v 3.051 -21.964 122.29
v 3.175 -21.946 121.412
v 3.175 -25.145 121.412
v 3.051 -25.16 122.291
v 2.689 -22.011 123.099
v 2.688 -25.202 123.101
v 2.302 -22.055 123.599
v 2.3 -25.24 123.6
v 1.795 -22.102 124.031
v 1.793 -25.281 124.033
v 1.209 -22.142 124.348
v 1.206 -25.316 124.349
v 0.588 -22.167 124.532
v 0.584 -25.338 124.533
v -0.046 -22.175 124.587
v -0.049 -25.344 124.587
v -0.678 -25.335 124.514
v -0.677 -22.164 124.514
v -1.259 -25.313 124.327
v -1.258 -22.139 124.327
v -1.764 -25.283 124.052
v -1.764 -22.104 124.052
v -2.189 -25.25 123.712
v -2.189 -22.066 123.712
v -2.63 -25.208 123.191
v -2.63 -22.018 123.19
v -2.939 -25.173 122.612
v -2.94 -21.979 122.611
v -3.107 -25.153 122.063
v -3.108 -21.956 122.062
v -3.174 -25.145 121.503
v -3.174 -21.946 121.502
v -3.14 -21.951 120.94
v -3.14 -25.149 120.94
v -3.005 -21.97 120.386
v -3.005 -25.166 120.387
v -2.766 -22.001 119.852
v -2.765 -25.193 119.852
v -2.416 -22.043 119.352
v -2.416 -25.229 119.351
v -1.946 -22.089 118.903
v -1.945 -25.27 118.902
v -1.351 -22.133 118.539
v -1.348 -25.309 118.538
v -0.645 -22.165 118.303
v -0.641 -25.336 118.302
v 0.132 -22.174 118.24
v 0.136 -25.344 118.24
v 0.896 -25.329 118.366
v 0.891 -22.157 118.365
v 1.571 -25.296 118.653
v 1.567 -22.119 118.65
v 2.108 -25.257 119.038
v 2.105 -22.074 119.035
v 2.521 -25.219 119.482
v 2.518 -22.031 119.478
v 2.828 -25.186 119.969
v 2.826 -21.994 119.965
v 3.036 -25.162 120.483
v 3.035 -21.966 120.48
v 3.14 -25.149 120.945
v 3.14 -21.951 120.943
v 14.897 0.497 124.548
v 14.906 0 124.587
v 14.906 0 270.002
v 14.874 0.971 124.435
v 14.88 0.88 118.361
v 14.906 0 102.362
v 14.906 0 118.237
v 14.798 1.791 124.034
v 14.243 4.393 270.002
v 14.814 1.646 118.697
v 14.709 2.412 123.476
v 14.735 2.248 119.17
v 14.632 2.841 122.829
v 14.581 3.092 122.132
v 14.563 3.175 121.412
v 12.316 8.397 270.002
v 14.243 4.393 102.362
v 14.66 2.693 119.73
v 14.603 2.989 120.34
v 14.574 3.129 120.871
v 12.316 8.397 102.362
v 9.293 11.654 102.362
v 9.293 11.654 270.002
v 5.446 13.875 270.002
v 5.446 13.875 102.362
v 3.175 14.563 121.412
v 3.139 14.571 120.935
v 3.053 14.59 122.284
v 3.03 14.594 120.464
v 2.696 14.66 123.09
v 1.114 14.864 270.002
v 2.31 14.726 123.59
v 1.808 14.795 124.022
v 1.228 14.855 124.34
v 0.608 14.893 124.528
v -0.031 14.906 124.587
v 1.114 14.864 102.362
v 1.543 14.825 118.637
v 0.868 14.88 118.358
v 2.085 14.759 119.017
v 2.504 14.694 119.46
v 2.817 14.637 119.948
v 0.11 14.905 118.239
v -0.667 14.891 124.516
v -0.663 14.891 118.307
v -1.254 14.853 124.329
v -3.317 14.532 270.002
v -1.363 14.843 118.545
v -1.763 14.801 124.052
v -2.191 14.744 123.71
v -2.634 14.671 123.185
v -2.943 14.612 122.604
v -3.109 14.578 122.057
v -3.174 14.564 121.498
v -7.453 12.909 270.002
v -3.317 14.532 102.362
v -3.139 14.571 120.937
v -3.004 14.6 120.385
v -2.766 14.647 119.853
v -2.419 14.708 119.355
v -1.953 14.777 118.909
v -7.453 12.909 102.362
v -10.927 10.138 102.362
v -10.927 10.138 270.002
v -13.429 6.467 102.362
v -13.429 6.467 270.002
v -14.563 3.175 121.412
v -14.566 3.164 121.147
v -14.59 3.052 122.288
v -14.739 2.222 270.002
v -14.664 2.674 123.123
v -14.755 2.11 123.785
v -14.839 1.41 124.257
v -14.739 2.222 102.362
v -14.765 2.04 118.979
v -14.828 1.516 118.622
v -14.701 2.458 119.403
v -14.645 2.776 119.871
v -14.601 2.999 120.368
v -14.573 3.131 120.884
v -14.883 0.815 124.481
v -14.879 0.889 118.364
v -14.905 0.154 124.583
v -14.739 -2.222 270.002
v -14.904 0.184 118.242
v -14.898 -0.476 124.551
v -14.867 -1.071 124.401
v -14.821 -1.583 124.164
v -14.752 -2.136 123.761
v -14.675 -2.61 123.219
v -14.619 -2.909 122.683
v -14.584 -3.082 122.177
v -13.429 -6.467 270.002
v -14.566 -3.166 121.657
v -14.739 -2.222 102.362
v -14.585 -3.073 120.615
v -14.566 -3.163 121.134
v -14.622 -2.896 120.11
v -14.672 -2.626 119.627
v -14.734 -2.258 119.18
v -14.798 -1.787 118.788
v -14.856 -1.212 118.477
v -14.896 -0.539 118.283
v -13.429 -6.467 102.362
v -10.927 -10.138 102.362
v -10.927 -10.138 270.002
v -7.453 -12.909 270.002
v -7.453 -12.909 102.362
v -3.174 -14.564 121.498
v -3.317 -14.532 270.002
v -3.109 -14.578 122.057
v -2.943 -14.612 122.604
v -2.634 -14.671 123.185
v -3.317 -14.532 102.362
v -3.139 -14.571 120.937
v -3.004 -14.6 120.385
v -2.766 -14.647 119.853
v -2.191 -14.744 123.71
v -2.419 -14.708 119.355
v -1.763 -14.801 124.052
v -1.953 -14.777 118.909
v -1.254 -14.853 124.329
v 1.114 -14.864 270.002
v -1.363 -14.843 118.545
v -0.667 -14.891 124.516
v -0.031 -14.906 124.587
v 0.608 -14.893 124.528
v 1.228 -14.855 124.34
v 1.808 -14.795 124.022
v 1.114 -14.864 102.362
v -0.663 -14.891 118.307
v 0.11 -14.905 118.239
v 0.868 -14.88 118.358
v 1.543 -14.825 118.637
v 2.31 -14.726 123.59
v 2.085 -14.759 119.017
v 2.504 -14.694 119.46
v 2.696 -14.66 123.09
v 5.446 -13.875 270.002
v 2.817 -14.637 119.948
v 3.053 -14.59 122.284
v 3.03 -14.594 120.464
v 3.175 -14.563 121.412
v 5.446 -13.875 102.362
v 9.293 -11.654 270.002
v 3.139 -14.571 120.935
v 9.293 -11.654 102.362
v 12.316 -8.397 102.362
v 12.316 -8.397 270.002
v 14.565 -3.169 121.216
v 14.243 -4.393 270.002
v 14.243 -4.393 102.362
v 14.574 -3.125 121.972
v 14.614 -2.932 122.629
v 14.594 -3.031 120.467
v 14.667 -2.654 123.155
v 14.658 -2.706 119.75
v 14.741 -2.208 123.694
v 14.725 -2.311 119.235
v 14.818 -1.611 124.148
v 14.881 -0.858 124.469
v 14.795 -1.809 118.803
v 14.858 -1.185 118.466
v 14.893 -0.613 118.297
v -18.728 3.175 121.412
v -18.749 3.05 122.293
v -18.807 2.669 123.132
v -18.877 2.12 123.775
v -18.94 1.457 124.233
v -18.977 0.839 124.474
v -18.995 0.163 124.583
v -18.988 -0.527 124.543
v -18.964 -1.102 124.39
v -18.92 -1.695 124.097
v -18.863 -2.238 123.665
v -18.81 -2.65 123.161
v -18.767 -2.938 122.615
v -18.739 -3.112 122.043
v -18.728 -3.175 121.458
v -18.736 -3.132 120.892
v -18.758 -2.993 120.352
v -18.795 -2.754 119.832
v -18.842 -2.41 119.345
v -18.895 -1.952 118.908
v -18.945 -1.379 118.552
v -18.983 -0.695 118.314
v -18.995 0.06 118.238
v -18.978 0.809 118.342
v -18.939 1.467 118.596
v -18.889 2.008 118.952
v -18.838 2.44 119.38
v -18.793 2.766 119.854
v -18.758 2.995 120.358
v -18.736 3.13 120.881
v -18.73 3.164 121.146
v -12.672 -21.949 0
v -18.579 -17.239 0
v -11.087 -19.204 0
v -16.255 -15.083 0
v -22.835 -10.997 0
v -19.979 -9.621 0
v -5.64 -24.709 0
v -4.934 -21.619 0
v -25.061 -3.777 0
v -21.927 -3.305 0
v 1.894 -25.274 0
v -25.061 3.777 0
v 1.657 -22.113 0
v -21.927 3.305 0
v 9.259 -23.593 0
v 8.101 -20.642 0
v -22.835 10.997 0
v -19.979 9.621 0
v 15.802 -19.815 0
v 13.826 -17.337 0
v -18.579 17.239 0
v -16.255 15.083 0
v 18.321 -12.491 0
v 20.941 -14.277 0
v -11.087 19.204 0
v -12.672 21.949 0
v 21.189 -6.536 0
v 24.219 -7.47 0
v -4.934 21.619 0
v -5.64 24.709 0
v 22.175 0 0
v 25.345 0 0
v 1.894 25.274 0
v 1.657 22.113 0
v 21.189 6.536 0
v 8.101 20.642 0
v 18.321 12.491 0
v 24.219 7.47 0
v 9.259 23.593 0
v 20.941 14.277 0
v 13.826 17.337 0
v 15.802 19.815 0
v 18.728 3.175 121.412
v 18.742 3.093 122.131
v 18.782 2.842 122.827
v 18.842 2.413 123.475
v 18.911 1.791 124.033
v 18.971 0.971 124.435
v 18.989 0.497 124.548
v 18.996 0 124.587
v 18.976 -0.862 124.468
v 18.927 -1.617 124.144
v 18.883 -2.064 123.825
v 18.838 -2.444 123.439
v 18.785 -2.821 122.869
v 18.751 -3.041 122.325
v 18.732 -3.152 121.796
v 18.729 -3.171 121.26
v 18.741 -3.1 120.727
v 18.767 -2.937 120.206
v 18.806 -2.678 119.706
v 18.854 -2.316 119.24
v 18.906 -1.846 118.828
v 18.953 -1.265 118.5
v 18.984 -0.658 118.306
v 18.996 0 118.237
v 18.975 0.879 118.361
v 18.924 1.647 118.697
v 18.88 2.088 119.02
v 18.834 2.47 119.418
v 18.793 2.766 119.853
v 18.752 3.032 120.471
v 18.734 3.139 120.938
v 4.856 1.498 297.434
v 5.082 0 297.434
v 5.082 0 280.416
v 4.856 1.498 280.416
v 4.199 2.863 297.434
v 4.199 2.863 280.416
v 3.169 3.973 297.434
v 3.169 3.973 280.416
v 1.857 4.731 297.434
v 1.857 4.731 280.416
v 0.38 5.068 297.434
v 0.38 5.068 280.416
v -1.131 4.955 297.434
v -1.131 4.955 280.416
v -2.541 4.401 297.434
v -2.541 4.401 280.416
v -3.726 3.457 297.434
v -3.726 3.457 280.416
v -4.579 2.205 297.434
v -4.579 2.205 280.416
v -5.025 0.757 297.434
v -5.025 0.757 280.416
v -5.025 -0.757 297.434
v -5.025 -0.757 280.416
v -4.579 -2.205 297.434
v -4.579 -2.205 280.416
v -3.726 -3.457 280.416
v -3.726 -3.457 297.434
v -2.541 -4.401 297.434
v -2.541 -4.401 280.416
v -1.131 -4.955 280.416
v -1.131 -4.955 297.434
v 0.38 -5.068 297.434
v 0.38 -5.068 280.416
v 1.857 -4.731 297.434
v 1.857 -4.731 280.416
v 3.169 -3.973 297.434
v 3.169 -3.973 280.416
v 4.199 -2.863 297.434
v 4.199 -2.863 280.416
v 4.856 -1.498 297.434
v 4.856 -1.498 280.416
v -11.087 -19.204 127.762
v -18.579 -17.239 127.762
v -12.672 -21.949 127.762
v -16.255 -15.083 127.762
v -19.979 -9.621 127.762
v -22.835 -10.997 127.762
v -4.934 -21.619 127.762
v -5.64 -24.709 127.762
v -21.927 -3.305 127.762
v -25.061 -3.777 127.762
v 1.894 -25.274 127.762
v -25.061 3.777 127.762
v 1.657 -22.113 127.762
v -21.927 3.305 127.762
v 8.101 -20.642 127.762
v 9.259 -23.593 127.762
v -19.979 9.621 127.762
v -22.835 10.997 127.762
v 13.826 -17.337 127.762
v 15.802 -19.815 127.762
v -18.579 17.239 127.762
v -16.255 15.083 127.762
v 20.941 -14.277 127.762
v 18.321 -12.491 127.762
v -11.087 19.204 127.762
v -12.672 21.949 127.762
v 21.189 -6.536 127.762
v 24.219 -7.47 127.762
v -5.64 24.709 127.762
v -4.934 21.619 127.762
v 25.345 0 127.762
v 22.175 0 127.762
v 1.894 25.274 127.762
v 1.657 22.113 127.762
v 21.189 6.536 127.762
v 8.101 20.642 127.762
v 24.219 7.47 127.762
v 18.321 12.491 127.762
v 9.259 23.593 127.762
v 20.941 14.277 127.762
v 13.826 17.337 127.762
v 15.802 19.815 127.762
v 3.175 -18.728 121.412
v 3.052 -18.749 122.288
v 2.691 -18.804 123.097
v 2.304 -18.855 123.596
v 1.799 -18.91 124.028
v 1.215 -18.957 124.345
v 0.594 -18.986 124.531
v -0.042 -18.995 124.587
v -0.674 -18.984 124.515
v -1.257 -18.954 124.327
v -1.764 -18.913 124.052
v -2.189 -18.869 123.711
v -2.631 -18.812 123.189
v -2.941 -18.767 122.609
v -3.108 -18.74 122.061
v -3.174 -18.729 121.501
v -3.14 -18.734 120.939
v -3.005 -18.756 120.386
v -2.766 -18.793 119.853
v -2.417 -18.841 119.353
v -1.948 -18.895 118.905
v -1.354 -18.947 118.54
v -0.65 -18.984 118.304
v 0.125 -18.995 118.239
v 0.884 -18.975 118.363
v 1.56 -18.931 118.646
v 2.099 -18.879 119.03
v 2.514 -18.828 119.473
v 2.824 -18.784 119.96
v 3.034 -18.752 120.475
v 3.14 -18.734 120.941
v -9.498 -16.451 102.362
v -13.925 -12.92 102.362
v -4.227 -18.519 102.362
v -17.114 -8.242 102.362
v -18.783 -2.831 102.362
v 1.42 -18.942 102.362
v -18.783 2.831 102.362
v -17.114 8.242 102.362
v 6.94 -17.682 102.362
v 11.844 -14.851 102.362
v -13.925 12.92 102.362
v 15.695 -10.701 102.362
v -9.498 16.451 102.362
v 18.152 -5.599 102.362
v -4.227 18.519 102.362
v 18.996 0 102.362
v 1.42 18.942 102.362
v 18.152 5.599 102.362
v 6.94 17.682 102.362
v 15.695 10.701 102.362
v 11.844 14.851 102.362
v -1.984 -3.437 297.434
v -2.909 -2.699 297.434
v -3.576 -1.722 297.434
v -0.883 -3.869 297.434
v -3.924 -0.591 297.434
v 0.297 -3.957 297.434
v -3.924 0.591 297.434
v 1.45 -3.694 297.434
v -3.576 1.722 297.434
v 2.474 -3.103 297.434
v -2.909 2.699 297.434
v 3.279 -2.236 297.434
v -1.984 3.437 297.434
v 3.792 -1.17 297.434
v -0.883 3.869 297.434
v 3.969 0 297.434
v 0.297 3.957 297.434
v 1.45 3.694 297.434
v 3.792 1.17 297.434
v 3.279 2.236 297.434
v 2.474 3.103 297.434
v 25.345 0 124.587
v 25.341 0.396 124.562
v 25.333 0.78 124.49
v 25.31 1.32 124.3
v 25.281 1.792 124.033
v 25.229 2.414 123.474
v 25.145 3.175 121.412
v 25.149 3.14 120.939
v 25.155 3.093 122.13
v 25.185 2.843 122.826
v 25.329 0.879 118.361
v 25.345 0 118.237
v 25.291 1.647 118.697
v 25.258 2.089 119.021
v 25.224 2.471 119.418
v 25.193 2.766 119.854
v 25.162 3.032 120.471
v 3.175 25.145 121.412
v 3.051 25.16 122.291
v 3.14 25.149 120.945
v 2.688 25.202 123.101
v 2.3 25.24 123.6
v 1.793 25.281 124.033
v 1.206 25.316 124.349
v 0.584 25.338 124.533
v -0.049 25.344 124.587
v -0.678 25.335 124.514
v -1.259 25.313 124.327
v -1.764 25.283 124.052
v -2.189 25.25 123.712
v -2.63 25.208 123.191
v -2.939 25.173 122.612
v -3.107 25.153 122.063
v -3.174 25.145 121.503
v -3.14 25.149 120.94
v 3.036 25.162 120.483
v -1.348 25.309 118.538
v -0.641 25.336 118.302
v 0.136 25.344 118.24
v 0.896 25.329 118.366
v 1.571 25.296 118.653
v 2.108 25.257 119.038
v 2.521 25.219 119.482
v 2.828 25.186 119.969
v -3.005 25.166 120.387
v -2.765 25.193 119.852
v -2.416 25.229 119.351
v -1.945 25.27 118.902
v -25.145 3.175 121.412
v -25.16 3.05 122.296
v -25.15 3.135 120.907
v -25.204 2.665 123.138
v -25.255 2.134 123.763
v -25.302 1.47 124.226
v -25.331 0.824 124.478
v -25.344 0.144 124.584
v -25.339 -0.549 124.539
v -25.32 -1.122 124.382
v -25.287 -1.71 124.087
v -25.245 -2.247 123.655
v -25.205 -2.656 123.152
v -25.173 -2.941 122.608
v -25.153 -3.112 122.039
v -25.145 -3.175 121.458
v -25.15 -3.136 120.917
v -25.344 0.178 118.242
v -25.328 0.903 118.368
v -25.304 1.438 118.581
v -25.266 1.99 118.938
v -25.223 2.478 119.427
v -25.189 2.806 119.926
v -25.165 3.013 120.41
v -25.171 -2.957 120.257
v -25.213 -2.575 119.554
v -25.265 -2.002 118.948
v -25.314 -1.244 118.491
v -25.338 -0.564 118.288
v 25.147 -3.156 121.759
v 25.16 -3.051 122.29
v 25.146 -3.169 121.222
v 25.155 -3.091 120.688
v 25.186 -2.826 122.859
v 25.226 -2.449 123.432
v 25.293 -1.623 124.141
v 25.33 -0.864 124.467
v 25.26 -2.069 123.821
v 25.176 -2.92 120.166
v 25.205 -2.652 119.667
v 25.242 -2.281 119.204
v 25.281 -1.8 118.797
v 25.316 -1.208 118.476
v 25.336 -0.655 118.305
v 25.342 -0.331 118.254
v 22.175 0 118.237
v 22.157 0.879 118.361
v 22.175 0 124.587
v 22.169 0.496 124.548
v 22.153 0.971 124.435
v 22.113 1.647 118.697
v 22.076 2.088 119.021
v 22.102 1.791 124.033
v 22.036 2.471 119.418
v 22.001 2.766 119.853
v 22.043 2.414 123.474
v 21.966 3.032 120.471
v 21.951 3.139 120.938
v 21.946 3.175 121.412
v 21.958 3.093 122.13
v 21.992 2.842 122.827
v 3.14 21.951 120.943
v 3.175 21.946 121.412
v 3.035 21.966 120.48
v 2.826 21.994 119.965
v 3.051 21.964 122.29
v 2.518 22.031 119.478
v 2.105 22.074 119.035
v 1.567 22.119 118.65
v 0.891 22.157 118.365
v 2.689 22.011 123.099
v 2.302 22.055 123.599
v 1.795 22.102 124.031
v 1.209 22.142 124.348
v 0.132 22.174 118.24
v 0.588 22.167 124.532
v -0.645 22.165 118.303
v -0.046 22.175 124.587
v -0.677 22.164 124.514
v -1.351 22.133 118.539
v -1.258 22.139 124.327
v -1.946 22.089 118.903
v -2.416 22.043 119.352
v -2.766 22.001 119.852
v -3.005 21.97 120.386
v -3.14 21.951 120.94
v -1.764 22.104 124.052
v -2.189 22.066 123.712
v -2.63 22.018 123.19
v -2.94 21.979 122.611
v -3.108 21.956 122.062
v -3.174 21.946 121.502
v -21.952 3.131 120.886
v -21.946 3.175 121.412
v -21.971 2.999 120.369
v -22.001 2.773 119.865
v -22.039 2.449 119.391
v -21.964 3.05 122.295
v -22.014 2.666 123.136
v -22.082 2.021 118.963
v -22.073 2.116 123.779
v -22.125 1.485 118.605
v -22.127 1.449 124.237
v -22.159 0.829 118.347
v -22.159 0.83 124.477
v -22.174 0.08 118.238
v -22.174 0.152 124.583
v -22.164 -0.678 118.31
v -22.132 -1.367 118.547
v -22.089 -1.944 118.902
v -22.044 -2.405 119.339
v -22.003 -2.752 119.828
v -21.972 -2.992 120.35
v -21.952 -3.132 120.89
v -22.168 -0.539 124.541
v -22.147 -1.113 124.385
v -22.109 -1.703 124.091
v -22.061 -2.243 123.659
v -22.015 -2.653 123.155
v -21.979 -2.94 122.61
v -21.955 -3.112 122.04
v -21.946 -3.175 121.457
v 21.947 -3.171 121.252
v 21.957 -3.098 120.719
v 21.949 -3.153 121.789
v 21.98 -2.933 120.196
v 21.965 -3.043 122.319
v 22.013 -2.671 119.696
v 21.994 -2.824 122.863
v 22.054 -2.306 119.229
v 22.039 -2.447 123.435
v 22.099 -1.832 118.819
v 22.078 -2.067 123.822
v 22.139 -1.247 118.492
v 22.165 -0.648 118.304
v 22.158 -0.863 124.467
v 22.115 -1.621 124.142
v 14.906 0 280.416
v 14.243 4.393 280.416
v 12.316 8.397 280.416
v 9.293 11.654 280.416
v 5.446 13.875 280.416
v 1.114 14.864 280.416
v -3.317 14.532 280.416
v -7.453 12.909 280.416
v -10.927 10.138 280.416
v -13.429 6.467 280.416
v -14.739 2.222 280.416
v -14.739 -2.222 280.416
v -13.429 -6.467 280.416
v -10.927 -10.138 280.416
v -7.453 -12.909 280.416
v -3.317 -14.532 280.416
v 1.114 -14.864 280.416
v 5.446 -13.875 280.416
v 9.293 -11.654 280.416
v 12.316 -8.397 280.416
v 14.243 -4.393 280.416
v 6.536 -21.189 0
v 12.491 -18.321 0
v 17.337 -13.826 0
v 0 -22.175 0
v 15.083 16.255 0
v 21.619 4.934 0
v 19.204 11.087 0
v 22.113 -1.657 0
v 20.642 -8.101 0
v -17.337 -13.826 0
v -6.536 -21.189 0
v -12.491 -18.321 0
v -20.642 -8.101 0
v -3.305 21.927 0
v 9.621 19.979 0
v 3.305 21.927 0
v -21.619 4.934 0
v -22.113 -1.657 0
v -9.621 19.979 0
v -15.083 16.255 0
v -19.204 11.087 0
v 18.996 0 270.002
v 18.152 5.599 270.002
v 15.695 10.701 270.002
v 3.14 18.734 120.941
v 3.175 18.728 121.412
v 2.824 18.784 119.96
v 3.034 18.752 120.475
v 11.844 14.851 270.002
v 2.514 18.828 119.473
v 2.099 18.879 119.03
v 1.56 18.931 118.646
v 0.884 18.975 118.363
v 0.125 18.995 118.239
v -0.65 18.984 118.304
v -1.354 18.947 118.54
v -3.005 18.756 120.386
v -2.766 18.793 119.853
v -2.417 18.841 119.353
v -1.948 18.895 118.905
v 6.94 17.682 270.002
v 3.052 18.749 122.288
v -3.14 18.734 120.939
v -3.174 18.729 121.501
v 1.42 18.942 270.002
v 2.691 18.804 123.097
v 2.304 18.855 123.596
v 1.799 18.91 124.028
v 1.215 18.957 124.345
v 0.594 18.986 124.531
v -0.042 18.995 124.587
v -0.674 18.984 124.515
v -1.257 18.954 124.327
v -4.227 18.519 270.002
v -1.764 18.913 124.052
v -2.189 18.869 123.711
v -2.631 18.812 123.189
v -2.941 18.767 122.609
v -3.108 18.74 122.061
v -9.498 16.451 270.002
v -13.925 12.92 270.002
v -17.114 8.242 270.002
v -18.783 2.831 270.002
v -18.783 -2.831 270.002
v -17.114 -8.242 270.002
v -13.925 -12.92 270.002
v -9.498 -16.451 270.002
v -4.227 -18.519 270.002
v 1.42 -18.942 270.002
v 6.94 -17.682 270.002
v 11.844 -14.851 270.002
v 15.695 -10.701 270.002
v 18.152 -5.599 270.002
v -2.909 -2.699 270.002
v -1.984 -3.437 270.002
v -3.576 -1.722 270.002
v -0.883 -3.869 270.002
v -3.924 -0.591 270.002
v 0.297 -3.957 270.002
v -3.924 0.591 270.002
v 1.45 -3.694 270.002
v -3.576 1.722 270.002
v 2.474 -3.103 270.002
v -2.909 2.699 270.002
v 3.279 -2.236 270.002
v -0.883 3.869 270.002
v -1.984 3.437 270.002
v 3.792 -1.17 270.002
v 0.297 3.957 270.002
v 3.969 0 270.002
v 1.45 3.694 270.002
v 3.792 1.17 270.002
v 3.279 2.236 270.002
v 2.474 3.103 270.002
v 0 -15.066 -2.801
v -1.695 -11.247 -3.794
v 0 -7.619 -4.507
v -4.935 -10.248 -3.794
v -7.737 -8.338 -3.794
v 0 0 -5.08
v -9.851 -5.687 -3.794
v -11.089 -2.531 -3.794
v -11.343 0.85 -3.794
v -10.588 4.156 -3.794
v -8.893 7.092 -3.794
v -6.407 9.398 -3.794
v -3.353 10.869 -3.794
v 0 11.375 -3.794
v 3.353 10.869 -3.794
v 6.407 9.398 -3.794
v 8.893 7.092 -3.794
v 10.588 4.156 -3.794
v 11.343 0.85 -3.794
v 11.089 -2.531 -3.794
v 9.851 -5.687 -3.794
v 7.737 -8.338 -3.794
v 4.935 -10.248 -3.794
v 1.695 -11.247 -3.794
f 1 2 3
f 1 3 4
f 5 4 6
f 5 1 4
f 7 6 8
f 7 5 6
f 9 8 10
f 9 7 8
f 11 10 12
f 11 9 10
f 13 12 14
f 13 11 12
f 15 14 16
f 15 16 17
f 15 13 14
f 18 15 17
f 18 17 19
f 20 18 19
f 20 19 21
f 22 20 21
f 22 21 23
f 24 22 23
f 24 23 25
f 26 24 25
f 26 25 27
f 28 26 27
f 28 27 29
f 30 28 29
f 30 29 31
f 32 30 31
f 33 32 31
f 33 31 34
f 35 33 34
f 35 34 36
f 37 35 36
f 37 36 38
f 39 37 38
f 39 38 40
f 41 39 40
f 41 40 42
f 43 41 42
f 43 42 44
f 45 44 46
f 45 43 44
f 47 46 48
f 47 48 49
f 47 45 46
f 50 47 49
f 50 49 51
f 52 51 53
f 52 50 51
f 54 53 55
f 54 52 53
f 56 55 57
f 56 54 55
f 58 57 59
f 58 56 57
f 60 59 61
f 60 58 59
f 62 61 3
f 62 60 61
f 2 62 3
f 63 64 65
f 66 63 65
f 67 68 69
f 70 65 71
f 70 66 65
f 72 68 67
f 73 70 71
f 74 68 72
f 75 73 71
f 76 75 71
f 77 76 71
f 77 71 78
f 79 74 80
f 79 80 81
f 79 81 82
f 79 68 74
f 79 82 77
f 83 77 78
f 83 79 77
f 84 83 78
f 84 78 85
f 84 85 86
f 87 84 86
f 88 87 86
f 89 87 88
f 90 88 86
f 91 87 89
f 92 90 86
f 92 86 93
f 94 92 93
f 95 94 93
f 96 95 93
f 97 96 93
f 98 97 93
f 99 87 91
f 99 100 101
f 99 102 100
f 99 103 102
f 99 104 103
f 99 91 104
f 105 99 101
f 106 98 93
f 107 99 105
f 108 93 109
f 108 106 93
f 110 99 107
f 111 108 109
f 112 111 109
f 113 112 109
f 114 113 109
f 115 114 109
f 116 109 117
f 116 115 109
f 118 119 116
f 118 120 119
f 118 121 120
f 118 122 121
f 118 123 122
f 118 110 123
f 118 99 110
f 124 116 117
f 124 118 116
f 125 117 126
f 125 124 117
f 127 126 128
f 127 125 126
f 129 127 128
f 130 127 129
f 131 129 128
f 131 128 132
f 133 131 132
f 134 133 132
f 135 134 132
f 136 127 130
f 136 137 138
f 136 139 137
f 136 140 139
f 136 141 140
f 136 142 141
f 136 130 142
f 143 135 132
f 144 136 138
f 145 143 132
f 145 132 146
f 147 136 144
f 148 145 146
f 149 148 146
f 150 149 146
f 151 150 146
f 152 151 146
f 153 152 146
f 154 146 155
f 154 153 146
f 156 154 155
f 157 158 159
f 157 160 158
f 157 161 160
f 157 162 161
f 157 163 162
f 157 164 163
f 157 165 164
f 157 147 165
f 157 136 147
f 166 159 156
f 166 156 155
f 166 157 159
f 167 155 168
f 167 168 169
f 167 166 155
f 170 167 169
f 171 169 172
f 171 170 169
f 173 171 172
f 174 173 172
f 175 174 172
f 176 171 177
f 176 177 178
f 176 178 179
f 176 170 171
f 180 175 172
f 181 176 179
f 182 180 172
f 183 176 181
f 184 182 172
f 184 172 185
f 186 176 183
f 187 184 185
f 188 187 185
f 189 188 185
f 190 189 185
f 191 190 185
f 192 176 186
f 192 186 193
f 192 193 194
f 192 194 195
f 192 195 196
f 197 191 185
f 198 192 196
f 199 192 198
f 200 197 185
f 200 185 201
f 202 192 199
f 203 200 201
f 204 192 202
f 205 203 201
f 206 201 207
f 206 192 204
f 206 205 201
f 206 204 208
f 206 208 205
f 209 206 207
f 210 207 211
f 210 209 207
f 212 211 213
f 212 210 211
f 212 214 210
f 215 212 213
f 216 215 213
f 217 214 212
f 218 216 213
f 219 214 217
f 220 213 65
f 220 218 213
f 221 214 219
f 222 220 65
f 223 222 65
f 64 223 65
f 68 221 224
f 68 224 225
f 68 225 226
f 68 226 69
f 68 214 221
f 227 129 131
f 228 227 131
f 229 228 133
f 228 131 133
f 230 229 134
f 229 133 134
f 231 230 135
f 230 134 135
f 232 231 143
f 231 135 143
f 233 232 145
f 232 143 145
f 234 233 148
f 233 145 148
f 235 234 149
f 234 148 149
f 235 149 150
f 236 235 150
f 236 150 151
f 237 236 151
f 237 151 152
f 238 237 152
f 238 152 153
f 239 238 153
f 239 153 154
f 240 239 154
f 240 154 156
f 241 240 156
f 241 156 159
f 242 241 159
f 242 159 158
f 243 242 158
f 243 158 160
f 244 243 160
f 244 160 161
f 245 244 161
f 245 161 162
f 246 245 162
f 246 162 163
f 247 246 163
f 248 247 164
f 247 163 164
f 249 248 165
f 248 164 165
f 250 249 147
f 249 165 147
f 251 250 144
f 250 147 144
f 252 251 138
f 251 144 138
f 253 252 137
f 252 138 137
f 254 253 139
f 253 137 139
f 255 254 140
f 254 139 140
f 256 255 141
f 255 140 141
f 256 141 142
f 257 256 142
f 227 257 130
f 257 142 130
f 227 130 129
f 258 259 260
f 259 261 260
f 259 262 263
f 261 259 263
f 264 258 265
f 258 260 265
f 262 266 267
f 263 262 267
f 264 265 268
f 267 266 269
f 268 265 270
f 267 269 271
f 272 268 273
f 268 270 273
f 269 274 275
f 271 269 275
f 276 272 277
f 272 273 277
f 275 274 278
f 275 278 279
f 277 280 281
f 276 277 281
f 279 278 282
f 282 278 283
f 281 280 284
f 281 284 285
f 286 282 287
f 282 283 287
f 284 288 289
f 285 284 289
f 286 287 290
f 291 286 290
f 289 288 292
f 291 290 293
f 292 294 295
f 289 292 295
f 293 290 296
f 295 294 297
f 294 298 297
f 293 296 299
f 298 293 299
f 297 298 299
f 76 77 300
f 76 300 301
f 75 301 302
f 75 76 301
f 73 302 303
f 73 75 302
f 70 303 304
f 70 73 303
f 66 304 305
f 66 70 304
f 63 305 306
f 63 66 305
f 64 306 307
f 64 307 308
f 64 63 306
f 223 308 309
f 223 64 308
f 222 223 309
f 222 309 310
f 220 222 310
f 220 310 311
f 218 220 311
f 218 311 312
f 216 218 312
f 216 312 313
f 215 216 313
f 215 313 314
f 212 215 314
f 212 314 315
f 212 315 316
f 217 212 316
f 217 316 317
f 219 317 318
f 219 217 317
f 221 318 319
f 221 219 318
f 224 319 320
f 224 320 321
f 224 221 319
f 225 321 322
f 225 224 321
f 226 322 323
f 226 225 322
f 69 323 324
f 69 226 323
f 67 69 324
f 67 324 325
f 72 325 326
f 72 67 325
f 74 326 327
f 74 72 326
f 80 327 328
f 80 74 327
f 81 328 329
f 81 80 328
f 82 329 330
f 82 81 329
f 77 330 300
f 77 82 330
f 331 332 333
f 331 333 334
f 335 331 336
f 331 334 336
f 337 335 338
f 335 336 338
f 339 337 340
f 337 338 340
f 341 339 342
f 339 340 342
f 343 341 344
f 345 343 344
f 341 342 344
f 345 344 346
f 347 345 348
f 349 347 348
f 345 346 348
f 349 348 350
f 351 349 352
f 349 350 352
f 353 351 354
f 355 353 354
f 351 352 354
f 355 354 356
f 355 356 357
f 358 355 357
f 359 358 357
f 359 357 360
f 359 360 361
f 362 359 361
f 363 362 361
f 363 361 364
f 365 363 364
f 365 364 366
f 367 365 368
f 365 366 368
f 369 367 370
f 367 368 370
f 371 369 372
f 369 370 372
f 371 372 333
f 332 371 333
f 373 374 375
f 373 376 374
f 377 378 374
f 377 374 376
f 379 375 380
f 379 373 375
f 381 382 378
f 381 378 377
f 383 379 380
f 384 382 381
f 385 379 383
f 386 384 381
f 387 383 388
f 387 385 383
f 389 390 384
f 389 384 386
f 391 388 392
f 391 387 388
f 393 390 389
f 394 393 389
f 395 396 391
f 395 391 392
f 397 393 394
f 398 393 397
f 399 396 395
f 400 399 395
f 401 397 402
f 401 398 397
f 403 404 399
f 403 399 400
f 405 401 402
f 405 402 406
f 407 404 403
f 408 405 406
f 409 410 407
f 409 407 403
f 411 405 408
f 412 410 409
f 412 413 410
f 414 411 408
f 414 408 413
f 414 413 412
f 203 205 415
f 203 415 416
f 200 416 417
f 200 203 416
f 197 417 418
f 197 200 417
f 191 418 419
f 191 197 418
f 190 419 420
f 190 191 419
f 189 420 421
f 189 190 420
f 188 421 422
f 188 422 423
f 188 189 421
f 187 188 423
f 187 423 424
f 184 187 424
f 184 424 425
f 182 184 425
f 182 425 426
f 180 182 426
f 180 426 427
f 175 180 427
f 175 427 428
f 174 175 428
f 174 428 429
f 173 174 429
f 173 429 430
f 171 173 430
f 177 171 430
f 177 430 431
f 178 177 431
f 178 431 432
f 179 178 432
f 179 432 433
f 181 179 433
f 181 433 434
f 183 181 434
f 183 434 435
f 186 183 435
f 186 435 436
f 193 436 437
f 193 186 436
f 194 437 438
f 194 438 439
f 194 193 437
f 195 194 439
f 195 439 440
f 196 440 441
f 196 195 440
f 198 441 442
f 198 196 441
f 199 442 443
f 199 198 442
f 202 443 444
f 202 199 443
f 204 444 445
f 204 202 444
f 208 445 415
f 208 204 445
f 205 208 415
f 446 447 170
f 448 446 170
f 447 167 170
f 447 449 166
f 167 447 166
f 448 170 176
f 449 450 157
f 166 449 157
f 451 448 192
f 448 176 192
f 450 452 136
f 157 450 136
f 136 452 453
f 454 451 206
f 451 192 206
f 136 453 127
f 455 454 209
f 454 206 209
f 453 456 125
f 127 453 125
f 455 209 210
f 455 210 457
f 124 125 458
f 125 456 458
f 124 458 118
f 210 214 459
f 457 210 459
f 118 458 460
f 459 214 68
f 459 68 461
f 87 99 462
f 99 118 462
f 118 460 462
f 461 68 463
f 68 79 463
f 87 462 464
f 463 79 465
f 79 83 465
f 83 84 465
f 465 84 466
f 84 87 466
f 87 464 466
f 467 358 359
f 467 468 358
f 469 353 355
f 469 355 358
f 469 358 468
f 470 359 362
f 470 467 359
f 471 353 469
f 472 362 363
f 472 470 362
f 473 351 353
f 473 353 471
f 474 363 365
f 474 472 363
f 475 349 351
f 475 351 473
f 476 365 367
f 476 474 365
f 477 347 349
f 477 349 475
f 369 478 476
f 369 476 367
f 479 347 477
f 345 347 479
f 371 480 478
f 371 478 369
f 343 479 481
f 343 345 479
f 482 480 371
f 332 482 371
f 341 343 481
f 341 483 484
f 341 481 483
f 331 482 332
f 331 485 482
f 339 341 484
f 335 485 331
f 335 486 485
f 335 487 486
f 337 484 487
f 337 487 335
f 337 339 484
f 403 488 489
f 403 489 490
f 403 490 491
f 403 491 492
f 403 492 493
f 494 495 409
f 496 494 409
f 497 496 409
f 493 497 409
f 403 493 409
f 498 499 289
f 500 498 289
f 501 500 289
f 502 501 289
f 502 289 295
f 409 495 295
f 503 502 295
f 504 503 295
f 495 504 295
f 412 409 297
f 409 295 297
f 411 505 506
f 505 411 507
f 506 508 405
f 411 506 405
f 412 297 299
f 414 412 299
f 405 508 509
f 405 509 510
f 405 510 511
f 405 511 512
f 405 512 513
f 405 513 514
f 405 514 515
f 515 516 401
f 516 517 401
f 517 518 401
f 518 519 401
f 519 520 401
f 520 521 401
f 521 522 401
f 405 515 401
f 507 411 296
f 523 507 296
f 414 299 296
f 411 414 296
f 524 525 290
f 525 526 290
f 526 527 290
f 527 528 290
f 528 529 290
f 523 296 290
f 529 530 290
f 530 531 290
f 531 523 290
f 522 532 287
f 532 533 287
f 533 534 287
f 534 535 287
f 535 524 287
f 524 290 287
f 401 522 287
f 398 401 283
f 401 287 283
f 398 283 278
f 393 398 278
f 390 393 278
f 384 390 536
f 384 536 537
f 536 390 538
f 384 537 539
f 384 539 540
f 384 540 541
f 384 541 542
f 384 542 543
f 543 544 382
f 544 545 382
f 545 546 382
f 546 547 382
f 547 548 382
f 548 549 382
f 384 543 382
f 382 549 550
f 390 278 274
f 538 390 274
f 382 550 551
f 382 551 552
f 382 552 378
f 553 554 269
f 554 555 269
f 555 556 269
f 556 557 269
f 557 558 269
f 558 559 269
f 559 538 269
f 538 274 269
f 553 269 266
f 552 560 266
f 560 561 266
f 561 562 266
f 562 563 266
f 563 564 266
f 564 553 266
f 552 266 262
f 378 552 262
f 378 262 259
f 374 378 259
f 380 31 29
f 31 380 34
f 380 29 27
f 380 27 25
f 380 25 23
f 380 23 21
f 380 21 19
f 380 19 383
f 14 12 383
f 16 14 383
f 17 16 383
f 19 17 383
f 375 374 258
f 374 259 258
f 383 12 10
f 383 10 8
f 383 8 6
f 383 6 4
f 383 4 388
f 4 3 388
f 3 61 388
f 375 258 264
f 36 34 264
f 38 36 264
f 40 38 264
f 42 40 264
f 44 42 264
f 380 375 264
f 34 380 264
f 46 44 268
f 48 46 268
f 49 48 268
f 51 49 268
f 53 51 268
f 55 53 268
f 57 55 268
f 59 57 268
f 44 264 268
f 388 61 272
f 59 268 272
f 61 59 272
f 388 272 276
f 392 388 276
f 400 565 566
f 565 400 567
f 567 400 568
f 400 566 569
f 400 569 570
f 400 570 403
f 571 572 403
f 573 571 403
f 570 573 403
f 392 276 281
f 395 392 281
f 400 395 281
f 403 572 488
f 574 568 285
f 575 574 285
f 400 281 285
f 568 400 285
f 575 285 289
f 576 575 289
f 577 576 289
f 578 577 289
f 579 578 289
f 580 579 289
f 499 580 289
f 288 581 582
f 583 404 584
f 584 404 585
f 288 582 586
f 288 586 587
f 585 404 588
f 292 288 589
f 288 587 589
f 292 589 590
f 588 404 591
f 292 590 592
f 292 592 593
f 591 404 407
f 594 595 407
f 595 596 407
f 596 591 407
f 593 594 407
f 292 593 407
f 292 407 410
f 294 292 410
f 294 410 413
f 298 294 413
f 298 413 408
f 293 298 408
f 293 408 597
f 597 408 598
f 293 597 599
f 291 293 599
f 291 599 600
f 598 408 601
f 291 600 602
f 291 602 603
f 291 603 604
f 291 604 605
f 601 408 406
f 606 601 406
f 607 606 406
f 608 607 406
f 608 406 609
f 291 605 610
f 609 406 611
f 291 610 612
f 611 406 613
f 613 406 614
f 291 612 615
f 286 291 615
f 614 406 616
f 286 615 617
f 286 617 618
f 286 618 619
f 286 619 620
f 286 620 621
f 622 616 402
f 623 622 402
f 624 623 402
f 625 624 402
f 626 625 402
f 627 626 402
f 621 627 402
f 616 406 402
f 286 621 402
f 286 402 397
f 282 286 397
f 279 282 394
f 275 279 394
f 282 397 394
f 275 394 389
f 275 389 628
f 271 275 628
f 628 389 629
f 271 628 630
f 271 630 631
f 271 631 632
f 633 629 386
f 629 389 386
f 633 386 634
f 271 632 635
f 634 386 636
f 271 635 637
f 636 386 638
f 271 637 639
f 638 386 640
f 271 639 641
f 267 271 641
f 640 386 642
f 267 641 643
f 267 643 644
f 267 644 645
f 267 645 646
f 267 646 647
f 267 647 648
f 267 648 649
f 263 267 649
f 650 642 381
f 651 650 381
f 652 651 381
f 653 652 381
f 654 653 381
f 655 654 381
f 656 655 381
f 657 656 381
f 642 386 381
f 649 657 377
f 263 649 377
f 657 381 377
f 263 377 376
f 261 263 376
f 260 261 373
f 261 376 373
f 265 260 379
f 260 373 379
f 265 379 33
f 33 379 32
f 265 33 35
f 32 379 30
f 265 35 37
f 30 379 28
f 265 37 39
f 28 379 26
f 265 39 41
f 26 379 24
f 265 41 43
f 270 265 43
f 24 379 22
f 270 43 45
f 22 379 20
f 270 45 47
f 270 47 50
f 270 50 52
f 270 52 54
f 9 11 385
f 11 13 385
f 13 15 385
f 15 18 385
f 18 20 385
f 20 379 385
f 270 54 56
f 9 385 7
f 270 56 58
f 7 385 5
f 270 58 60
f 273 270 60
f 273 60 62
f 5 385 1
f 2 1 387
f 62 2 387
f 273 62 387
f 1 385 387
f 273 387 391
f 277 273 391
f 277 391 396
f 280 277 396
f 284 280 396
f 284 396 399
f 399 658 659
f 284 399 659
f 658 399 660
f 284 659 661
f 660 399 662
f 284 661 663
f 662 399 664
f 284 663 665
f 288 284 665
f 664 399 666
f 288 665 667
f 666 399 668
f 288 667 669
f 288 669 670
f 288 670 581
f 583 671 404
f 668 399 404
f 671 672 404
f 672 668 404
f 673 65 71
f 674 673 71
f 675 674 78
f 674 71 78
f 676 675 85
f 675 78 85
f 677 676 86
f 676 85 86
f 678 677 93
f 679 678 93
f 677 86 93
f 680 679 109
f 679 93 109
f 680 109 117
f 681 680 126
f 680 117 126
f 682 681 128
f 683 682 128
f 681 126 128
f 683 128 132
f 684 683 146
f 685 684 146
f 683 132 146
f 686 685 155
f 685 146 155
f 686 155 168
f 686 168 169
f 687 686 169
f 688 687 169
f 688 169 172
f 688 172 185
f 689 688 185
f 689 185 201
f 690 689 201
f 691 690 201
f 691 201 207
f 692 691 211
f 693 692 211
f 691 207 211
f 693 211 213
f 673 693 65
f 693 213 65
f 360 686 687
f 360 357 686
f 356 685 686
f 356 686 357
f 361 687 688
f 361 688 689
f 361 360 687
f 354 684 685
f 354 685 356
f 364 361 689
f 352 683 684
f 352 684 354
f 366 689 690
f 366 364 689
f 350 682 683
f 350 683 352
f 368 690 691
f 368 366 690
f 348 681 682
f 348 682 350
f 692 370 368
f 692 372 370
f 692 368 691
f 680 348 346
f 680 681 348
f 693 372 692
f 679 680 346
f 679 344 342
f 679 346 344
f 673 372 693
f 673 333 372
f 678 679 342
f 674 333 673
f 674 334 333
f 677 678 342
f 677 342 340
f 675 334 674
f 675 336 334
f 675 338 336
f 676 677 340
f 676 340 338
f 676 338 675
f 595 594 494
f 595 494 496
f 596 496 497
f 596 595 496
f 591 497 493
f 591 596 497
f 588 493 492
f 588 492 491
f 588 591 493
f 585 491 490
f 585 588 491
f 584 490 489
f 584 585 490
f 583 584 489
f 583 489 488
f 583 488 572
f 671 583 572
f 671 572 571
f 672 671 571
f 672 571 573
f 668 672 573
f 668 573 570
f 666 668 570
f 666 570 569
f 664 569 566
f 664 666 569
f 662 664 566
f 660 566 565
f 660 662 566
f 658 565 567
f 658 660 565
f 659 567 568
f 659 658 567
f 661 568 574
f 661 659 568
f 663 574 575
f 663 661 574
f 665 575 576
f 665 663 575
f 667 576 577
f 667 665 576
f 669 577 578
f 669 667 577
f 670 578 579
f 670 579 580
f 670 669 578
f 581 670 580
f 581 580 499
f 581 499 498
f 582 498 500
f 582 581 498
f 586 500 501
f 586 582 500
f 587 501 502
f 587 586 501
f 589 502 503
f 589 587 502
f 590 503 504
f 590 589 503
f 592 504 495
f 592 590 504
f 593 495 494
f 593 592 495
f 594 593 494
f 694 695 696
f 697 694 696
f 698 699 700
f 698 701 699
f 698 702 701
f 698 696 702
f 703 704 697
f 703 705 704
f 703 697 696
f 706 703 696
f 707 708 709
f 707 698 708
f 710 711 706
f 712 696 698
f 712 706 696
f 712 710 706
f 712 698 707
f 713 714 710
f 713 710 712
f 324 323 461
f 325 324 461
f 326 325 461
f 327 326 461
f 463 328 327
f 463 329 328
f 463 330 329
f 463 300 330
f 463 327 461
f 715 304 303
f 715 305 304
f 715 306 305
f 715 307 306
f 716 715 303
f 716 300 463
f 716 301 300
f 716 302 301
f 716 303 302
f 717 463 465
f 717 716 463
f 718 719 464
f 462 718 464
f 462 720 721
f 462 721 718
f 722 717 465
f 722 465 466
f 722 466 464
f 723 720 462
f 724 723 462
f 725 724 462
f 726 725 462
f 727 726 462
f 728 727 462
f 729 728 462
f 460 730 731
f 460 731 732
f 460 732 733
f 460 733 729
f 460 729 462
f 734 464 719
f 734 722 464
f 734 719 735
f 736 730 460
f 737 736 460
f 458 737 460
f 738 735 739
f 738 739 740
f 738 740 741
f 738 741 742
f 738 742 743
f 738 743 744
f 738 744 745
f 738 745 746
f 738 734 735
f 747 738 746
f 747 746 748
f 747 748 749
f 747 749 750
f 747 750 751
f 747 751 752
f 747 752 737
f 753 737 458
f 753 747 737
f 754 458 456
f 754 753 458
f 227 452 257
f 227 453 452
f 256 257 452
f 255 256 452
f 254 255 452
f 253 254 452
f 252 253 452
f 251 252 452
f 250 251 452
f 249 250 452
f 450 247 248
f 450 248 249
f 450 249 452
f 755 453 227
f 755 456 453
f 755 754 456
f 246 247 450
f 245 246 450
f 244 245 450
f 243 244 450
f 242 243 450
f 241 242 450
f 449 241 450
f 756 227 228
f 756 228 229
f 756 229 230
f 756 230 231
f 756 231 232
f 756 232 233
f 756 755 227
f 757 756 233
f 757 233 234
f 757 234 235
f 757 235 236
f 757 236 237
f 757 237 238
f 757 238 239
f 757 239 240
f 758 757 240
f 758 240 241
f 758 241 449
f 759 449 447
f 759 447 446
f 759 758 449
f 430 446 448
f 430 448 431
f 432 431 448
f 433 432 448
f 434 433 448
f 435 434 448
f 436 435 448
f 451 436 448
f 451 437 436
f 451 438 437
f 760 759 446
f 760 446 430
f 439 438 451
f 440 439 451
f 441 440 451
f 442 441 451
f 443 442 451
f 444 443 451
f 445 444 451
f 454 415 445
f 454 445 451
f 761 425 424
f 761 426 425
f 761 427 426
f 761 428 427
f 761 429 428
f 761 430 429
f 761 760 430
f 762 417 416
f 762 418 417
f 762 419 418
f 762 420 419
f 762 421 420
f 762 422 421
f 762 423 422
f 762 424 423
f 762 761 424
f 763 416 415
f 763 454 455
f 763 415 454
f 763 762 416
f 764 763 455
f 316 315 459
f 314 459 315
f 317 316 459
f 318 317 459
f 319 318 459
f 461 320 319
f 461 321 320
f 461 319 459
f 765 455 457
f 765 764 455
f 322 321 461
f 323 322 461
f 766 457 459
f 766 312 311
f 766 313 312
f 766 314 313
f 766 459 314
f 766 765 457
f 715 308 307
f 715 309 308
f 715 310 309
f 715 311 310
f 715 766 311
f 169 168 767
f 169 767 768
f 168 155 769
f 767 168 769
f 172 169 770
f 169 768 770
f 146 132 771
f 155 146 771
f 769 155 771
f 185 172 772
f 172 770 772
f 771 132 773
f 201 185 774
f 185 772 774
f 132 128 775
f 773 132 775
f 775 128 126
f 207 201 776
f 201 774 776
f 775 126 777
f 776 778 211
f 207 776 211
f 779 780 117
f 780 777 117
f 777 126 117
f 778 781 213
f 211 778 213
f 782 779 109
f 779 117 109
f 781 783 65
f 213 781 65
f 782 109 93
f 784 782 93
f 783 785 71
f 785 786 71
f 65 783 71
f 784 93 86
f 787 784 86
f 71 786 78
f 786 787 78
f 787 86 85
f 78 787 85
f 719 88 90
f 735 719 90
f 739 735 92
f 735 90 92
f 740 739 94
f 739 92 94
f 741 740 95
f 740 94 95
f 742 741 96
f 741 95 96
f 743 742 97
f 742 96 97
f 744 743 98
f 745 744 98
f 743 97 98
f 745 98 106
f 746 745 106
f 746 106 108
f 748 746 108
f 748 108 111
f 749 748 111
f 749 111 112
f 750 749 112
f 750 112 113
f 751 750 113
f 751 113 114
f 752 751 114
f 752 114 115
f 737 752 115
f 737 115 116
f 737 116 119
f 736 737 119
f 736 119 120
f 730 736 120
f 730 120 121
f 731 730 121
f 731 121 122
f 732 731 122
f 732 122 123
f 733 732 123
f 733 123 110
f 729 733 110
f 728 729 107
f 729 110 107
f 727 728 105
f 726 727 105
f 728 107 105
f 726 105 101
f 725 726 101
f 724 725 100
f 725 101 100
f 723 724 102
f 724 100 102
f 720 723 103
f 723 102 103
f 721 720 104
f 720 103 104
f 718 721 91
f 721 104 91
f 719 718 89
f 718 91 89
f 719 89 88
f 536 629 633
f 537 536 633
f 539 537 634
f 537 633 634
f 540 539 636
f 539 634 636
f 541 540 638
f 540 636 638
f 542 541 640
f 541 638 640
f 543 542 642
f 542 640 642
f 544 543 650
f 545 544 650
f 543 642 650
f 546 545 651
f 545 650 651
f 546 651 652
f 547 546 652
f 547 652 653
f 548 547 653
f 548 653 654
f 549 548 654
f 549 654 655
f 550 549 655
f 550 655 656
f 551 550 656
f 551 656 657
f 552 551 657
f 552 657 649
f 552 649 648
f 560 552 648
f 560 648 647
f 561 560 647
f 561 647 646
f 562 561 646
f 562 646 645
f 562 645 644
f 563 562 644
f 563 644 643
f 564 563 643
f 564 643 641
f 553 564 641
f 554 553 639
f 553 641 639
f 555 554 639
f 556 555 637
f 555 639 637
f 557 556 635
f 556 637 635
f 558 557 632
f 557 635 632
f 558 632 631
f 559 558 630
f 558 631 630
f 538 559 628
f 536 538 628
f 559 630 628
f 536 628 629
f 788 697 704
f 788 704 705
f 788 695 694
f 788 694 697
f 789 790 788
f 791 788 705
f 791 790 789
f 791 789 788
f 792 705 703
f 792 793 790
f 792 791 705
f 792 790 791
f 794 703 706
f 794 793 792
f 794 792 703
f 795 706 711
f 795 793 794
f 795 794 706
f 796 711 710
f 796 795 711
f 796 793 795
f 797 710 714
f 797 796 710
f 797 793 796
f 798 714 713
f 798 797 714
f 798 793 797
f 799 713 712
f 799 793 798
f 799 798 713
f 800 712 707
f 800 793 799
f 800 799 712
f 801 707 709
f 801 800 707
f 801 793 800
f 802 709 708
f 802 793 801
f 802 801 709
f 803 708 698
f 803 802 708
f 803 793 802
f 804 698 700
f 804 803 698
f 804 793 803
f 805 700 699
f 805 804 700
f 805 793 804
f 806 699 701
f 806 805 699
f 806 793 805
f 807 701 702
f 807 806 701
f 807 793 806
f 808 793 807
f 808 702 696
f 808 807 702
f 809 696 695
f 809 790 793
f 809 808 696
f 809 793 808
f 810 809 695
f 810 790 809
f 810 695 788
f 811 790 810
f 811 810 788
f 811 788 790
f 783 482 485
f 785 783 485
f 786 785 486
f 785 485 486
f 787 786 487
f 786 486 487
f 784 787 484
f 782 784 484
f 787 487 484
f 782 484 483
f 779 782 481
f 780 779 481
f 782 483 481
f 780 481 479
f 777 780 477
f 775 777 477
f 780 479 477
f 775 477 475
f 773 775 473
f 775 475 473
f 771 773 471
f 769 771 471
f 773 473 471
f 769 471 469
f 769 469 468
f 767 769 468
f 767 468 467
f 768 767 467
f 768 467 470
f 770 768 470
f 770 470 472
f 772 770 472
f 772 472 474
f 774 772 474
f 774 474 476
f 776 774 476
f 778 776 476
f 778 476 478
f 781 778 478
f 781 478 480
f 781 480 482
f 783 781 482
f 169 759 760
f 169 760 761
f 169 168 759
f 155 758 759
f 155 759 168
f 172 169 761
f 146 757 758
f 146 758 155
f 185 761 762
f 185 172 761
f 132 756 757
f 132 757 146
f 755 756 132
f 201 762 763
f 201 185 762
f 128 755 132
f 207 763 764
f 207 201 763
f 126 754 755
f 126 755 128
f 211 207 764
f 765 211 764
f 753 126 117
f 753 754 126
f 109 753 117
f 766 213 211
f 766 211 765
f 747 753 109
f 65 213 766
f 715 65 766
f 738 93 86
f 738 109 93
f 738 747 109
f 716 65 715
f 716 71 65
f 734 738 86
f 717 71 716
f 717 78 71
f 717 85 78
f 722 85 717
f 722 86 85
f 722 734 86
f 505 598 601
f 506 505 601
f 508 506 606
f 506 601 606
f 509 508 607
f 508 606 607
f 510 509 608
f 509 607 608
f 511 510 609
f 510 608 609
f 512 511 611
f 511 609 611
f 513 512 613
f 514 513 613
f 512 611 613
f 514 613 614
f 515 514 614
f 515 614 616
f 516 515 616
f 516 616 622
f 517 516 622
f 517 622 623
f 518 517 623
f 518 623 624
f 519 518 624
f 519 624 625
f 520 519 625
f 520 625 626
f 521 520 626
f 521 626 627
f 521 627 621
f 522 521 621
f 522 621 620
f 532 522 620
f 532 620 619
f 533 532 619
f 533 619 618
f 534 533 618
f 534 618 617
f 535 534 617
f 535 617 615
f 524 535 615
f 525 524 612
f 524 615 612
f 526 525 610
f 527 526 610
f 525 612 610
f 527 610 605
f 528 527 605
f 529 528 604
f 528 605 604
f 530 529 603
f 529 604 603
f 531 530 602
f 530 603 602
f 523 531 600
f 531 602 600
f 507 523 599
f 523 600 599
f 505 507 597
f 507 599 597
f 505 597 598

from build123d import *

# Parameters (mm, degrees)
F0_R           = 25.344518306
F1_DEPTH       = 127.762
F2_R           = 22.1745726993
F3_DEPTH       = 127.763
F4_R           = 18.9955290519
F4_R_2         = 14.9055490035
F5_DEPTH       = 142.24
F6_DEPTH       = 25.4
F7_R           = 3.175
F8_DEPTH       = 25.345518306
F8_DEPTH_BACK  = 25.4
F9_R           = 3.175
F10_DEPTH      = 25.345518406
F10_DEPTH_BACK = 25.4
F13_R          = 14.9055490035
F14_DEPTH      = 10.414
F15_R          = 5.0822027906
F16_DEPTH      = 17.018
F17_R          = 3.9685547881
F18_DEPTH      = 302.515


with BuildPart() as f1:
    # F0 (on Top) → F1 (new body)
    with BuildSketch(Plane.XY):
        Circle(F0_R)
    extrude(amount=F1_DEPTH)

    # F2 (on face) → F3 (cut, through all)
    with BuildSketch(Plane.XY.offset(127.762)):
        Circle(F2_R)
    extrude(amount=-F3_DEPTH, mode=Mode.SUBTRACT)


with BuildPart() as f5:
    # F4 (on face) → F5 (new body)
    with BuildSketch(Plane.XY.offset(127.762)):
        Circle(F4_R)
        Circle(F4_R_2, mode=Mode.SUBTRACT)
    extrude(amount=F5_DEPTH)

    # F4 (on face) → F6 (join)
    with BuildSketch(Plane.XY.offset(127.762)):
        Circle(F4_R)
        Circle(F4_R_2, mode=Mode.SUBTRACT)
    extrude(amount=-F6_DEPTH)


with BuildPart() as f8_tool:
    # F7 (on Right) → F8 (new body, two sides)
    with BuildSketch(Plane.YZ) as f8_sk:
        with Locations((0, 121.412)):
            Circle(F7_R)
    extrude(amount=-F8_DEPTH)
    extrude(f8_sk.sketch, amount=F8_DEPTH_BACK)


with BuildPart() as f1_1:
    add(f1.part)

    # F8: cut by f8_tool
    add(f8_tool.part, mode=Mode.SUBTRACT)


with BuildPart() as f5_1:
    add(f5.part)

    # F8: cut by f8_tool
    add(f8_tool.part, mode=Mode.SUBTRACT)


with BuildPart() as f10_tool:
    # F9 (on Front) → F10 (new body, two sides)
    with BuildSketch(Plane.XZ) as f10_sk:
        with Locations((0, 121.412)):
            Circle(F9_R)
    extrude(amount=-F10_DEPTH)
    extrude(f10_sk.sketch, amount=F10_DEPTH_BACK)


with BuildPart() as f1_2:
    add(f1_1.part)

    # F10: cut by f10_tool
    add(f10_tool.part, mode=Mode.SUBTRACT)


with BuildPart() as f5_2:
    add(f5_1.part)

    # F10: cut by f10_tool
    add(f10_tool.part, mode=Mode.SUBTRACT)


with BuildPart() as f12:
    # F11 (on Right) → F12 (revolve)
    with BuildSketch(Plane.YZ):
        with BuildLine():
            Line((0, 0), (-22.1745726993, 0))
            ThreePointArc((-22.1745726993, 0), (-11.3745117961, -3.7937601462), (0, -5.08))
            Line((0, -5.08), (0, 0))
        make_face()
    revolve(axis=Axis((0, 0, -2.54), (0, 0, -1)))


with BuildPart() as f14:
    # F13 (on face) → F14 (new body)
    with BuildSketch(Plane.XY.offset(270.002)):
        Circle(F13_R)
    extrude(amount=F14_DEPTH)

    # F15 (on face) → F16 (join)
    with BuildSketch(Plane.XY.offset(280.416)):
        Circle(F15_R)
    extrude(amount=F16_DEPTH)

    # F17 (on face) → F18 (cut, through all)
    with BuildSketch(Plane.XY.offset(297.434)):
        Circle(F17_R)
    extrude(amount=-F18_DEPTH, mode=Mode.SUBTRACT)


solid = Compound([f1_2.part, f5_2.part, f12.part, f14.part])
